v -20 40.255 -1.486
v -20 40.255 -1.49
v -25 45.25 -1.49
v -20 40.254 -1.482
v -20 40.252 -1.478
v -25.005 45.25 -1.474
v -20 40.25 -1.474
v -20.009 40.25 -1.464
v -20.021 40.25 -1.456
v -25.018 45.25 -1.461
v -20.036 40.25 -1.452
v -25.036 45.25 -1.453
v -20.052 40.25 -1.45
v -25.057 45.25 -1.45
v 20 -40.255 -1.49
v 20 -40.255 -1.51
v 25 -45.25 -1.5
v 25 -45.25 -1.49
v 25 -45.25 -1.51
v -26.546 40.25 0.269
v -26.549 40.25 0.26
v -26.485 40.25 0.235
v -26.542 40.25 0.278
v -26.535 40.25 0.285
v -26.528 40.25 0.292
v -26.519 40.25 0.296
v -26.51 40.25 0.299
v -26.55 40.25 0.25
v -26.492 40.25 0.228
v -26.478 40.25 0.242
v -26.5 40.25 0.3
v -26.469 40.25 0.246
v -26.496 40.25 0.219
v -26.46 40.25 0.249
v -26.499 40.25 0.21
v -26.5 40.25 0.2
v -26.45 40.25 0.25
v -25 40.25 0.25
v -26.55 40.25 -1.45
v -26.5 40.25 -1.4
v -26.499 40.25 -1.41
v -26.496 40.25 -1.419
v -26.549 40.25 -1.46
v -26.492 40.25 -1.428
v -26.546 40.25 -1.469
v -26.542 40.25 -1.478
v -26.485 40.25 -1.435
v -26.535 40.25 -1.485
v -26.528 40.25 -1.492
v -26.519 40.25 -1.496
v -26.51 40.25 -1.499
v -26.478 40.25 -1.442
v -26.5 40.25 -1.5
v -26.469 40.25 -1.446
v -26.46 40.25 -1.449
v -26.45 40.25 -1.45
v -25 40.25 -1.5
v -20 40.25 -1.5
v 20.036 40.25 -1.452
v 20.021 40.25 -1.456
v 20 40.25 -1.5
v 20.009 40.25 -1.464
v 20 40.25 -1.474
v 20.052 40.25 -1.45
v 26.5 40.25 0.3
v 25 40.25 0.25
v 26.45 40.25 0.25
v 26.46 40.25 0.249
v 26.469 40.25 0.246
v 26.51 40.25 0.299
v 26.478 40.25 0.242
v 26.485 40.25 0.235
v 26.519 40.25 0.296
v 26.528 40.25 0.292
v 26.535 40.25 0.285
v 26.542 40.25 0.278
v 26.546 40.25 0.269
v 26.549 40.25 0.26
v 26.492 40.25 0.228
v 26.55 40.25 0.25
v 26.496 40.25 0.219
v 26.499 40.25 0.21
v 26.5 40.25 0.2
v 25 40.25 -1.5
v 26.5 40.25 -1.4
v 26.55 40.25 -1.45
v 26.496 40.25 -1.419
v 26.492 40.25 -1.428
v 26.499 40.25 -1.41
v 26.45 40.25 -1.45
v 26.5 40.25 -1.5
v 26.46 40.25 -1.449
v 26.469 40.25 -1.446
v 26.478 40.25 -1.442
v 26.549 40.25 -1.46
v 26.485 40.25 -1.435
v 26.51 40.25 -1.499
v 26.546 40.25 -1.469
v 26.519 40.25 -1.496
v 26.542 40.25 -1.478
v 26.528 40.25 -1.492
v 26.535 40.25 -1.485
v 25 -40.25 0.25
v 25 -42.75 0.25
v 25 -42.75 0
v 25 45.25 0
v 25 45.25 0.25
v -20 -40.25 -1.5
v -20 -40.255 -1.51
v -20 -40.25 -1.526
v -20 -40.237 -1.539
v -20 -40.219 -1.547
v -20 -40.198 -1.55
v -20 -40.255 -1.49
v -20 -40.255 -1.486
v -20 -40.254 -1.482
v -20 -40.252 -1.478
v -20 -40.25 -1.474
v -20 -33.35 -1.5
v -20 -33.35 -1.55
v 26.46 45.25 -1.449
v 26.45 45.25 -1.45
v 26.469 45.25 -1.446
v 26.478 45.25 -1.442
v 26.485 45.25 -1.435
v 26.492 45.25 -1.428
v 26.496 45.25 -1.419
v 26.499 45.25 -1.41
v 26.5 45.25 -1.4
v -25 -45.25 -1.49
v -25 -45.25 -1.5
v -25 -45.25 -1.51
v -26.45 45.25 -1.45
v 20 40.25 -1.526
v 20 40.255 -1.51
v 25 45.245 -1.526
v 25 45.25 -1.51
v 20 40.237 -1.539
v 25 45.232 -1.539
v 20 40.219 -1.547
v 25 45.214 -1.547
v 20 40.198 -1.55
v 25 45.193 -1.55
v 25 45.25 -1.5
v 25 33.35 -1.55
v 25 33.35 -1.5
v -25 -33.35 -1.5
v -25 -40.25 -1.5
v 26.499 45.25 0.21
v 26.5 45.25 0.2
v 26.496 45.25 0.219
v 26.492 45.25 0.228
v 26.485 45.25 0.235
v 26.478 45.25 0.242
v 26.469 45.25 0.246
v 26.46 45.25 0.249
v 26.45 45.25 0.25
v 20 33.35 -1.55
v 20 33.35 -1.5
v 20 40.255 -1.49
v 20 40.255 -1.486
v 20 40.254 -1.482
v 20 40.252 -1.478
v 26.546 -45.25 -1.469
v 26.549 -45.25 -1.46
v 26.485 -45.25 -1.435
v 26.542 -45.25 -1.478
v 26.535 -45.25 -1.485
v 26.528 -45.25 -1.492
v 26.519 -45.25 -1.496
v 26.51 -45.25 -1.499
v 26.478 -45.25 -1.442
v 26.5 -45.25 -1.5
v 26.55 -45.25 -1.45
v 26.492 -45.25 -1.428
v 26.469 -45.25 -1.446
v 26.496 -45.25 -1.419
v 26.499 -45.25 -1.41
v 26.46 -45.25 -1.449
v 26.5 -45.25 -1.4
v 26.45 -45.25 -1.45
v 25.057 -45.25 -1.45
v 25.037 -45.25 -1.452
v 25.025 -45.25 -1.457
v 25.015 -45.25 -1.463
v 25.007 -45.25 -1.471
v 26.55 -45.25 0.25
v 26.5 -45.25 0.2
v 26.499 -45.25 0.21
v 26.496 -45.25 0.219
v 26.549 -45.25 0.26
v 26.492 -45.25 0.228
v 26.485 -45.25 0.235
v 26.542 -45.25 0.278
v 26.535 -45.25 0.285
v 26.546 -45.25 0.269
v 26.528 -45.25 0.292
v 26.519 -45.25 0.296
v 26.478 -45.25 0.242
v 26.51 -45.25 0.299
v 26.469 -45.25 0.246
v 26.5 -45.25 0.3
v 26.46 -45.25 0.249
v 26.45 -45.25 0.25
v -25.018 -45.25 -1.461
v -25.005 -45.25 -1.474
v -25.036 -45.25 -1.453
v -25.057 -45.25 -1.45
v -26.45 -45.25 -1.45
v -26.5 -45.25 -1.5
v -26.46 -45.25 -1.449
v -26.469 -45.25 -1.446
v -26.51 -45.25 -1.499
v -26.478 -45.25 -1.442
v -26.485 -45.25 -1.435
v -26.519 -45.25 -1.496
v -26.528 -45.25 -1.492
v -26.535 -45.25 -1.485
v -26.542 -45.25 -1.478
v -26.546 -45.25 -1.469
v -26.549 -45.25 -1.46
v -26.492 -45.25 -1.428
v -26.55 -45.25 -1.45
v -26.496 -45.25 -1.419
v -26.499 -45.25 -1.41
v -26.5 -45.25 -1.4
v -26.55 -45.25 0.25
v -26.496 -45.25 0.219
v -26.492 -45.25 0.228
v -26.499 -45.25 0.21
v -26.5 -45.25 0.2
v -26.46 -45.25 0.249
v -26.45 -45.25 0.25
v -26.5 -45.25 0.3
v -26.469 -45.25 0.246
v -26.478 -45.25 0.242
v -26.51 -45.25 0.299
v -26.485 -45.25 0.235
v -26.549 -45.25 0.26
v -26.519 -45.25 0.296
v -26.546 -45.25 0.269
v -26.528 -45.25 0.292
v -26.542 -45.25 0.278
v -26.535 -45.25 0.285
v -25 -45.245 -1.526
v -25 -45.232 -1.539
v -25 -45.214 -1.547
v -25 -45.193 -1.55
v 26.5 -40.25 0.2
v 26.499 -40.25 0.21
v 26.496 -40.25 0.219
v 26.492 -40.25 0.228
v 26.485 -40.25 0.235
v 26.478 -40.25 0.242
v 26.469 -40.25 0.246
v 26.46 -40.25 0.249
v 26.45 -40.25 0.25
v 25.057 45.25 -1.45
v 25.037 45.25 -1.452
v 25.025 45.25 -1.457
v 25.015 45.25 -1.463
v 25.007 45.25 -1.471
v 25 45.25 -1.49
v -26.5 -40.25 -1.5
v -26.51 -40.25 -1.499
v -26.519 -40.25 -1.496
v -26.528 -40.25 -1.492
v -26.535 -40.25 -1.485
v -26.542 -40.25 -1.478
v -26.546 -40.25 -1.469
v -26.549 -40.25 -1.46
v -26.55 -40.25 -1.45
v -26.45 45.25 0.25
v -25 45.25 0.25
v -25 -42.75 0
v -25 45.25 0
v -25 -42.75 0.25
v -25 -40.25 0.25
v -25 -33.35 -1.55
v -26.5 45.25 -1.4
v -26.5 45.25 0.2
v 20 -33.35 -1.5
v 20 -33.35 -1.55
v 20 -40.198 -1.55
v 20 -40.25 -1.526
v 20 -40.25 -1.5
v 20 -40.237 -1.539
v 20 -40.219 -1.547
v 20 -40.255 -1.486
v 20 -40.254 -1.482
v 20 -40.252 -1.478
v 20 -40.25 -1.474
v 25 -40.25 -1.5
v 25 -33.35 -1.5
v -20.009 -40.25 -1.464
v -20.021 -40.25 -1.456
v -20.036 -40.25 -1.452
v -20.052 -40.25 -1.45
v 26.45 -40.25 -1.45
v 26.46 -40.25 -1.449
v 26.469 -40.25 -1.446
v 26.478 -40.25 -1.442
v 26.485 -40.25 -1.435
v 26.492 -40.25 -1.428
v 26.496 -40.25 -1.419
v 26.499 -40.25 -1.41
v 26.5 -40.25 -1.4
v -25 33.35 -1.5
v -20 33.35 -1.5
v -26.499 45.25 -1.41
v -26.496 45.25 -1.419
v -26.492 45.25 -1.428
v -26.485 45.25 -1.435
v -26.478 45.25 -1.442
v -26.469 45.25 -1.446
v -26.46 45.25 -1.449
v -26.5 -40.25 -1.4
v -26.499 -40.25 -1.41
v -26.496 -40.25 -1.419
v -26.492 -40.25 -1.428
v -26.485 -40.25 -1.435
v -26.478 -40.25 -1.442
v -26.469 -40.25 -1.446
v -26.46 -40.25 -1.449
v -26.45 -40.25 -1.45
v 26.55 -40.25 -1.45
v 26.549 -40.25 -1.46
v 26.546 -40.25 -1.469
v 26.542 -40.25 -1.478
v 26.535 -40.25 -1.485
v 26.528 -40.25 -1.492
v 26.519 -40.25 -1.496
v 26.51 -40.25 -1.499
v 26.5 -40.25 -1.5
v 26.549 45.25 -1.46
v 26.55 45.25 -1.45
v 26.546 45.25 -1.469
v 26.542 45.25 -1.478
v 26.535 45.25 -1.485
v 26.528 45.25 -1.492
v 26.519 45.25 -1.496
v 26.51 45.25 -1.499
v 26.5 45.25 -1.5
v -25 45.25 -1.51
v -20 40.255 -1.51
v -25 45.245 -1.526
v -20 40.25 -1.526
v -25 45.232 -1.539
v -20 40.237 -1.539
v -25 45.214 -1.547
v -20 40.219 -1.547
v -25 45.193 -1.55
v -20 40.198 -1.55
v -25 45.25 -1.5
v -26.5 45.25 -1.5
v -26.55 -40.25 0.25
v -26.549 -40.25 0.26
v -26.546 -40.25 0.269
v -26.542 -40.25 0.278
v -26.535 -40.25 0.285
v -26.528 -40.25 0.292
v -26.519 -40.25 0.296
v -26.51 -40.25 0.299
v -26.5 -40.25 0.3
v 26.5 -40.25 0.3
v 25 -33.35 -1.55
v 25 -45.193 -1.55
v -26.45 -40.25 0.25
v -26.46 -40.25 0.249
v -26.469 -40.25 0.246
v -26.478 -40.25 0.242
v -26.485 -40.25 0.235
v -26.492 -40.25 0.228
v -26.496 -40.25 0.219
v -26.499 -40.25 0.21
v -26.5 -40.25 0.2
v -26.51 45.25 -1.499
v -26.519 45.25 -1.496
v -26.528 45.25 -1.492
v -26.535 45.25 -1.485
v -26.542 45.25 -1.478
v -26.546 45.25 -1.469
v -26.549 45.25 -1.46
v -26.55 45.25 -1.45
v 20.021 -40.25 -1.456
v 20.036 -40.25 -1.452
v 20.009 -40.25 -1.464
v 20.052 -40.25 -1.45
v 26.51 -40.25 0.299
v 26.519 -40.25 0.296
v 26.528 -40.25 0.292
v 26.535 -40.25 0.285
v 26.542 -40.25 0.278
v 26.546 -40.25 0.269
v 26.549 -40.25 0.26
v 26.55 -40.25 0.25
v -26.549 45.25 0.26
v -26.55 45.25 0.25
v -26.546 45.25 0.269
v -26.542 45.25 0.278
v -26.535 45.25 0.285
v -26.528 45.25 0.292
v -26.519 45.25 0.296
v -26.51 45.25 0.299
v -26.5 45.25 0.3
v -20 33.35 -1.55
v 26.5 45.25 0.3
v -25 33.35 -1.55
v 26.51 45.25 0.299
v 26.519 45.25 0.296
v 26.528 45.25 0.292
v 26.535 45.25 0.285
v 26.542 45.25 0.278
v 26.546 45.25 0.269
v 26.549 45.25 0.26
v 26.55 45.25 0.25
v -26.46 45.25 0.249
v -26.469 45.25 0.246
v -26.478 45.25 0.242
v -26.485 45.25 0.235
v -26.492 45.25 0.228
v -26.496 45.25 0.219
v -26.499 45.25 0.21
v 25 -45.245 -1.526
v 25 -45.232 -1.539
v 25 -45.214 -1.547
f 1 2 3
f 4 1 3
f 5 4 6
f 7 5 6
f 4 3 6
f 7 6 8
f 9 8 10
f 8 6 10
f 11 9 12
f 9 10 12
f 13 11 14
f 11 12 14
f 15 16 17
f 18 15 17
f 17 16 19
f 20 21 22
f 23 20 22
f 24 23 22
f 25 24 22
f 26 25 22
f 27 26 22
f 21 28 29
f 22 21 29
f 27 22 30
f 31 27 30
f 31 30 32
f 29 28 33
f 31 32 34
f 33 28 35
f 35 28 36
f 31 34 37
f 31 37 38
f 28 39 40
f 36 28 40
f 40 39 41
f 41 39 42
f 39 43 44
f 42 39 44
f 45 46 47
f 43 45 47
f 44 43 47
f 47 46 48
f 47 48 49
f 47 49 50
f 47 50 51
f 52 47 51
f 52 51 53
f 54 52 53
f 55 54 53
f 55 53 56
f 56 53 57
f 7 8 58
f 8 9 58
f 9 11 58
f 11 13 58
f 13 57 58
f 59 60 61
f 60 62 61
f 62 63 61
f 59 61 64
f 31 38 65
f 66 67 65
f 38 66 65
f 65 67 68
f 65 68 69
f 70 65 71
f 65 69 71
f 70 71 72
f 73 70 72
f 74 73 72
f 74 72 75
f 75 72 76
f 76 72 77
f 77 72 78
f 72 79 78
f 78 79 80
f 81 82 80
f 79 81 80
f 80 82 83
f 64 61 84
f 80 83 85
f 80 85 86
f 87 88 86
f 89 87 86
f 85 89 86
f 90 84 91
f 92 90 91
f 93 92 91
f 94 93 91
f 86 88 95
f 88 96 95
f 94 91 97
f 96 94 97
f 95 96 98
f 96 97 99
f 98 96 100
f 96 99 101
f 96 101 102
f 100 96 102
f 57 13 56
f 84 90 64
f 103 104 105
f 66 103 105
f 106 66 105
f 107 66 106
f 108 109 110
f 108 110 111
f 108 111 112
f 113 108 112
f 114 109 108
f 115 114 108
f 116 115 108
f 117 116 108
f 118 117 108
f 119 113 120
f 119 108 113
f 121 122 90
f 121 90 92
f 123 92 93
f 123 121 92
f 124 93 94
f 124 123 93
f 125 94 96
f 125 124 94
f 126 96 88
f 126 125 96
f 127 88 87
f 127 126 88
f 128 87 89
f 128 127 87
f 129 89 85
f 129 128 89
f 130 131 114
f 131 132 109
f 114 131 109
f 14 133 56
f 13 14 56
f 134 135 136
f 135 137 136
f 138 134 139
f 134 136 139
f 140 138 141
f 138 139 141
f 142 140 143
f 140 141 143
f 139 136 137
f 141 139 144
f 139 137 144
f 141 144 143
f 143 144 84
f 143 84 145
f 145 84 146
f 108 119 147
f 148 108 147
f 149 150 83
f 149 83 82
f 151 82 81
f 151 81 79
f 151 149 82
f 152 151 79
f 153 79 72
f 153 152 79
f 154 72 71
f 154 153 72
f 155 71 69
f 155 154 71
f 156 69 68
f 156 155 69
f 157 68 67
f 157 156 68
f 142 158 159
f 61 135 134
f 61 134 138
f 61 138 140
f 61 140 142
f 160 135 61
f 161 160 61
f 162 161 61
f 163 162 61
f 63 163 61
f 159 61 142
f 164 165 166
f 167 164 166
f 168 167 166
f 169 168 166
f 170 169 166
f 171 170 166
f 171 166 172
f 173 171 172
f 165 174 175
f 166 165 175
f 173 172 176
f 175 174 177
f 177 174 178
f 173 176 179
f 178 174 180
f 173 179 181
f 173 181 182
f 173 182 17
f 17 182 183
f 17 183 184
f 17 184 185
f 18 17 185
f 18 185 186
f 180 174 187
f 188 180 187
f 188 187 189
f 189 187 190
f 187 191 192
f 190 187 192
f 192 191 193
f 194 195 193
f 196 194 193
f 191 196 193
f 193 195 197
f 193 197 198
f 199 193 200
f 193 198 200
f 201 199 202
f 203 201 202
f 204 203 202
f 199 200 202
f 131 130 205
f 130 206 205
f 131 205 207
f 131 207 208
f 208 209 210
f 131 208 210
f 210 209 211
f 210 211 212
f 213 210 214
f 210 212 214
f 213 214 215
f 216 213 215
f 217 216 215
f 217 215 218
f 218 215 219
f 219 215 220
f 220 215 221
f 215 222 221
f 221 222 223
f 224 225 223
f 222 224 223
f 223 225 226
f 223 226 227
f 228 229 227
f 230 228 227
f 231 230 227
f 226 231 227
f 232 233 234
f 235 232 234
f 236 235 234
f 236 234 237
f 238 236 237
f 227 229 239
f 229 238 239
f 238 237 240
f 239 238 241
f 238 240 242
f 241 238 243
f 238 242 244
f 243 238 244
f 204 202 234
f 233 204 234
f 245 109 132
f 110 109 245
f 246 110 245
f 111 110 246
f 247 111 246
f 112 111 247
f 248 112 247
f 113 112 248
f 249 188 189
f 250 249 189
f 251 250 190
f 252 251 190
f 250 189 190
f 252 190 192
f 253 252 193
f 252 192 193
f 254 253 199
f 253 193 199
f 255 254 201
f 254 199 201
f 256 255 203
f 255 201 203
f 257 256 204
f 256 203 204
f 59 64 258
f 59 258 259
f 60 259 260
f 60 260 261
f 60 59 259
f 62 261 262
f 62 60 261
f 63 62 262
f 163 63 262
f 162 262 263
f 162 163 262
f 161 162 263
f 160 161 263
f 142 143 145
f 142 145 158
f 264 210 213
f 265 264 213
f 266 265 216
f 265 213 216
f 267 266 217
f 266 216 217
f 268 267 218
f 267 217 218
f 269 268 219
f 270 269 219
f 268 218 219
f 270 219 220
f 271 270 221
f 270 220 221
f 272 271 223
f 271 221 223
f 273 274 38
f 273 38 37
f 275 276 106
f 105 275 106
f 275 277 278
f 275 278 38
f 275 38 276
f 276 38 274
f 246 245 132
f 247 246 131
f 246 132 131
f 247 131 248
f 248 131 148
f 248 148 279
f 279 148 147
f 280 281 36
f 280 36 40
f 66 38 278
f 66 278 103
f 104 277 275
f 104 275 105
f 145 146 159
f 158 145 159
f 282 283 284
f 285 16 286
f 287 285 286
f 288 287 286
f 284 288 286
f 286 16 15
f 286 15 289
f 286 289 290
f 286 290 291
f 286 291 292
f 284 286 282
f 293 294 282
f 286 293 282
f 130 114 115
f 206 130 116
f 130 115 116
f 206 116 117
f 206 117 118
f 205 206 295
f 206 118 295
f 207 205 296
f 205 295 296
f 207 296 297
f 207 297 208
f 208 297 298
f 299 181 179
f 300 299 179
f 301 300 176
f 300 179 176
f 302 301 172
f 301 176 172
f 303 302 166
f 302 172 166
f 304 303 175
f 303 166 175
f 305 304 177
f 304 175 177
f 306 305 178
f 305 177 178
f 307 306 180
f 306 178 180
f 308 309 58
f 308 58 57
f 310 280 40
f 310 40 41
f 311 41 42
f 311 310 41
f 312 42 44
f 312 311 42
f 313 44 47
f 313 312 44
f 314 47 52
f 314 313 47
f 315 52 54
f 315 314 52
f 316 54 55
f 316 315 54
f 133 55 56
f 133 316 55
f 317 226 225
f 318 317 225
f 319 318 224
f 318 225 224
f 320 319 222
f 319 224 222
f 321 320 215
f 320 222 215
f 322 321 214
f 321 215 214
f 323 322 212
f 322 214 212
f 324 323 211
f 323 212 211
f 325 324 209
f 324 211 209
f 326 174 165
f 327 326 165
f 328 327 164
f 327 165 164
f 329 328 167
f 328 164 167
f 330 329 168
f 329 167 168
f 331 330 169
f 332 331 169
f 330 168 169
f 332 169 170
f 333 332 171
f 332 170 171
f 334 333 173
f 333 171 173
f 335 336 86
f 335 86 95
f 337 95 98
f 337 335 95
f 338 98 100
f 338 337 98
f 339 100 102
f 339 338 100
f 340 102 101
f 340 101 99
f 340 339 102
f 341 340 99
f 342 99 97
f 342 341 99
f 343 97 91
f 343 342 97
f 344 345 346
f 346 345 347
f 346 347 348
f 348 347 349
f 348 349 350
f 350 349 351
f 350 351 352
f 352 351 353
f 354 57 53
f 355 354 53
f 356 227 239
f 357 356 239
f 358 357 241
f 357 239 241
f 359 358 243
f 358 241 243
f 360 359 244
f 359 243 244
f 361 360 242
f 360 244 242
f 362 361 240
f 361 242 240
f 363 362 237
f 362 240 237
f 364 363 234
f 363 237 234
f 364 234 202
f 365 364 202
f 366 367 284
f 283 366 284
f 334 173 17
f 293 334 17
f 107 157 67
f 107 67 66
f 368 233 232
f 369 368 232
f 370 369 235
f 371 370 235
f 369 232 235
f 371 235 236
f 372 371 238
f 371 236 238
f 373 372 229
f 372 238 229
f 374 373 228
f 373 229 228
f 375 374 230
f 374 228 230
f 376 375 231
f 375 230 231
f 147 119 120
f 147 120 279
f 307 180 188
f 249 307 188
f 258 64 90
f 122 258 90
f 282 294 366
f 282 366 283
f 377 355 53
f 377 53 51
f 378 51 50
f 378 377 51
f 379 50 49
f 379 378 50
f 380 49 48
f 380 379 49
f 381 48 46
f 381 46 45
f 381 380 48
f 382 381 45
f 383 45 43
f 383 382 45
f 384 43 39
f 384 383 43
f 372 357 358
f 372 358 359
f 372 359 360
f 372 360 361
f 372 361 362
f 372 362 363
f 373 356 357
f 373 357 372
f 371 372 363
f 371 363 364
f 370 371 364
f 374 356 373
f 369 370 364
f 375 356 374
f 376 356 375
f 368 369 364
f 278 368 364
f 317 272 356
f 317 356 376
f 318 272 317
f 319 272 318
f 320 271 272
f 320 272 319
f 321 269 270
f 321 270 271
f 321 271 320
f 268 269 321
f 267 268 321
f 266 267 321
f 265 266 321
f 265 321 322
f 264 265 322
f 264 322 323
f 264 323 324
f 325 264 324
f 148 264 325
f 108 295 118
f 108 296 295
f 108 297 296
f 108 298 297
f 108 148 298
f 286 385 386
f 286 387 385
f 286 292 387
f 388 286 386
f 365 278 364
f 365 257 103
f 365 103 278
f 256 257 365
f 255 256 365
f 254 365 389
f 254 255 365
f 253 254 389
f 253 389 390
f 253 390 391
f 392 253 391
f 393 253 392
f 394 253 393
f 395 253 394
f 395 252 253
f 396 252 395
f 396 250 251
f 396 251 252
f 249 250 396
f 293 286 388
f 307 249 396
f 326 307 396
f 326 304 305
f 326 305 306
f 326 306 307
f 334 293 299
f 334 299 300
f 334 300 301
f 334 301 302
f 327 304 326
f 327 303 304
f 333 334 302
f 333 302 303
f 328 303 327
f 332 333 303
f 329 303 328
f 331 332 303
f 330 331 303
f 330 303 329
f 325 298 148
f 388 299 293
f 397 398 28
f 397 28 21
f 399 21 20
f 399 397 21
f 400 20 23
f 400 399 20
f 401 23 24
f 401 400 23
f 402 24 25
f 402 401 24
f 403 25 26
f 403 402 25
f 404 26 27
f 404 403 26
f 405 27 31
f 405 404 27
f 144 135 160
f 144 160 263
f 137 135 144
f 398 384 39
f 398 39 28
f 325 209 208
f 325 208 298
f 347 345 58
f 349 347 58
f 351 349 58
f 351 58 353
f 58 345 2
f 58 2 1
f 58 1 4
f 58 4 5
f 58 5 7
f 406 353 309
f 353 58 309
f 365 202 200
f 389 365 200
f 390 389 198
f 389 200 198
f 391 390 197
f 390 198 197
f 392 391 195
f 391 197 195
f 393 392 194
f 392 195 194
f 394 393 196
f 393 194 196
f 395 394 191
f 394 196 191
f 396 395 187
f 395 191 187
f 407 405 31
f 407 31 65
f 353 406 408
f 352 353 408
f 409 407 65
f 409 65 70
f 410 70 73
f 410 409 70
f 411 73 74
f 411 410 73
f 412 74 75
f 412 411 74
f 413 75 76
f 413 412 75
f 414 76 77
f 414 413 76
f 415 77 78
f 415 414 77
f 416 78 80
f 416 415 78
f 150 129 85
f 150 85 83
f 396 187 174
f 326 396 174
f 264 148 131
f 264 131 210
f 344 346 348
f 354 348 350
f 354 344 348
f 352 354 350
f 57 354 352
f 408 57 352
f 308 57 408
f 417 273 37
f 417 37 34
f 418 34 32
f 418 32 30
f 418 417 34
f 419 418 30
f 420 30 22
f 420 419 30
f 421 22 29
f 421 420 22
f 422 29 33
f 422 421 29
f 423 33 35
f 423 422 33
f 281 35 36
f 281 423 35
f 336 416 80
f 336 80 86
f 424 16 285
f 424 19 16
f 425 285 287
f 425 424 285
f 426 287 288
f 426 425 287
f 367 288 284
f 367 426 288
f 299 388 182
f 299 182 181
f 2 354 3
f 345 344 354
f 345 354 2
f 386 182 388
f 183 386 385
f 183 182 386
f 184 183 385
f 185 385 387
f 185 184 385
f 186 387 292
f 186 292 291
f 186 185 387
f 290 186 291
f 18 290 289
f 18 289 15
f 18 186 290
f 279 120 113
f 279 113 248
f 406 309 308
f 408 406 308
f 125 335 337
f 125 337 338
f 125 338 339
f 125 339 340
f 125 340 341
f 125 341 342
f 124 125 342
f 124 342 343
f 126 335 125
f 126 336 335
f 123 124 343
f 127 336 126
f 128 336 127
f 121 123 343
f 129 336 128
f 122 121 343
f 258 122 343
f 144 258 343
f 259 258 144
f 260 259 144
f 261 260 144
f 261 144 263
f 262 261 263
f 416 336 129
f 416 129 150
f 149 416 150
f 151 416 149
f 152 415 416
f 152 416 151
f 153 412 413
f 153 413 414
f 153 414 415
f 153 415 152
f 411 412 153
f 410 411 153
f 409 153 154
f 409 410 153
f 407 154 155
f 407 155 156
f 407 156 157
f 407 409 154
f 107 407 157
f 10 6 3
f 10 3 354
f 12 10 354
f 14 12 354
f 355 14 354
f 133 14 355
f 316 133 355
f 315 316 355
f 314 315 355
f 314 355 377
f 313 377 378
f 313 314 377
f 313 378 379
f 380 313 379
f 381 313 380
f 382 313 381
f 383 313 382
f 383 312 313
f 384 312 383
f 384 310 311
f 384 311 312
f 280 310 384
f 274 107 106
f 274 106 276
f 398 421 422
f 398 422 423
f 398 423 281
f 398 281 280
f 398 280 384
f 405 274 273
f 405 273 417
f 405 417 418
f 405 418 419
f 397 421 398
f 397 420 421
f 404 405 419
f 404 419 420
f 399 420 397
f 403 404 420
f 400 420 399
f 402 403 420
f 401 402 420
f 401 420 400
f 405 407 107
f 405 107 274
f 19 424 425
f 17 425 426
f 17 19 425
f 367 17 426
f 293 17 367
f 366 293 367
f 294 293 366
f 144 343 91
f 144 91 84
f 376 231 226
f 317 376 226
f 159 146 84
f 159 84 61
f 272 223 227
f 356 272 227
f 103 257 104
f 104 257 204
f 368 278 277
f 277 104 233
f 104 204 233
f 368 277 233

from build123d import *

# Parameters (mm, degrees)
SKETCH1_W            = 50
SKETCH1_H            = 88
BOSS_EXTRUDE1_DEPTH  = 0.25
BOSS_EXTRUDE2_DEPTH  = 5
SKETCH5_W            = 5
SKETCH5_H            = 11.9
BOSS_EXTRUDE3_DEPTH  = 0.05
CUT_EXTRUDE1_DEPTH   = 0.2
FILLET1_R            = 0.04
FILLET1_OF_MIRROR1_R = 0.04


with BuildPart() as part:
    # Sketch1 → Boss-Extrude1 (new body)
    with BuildSketch(Plane.XY.offset(0.25)):
        with Locations((0, 1.25)):
            Rectangle(SKETCH1_W, SKETCH1_H)
    extrude(amount=-BOSS_EXTRUDE1_DEPTH)

    # Sketch4 → Boss-Extrude2 (add)
    with BuildSketch(Plane(origin=(0, -45.25, 0), x_dir=(-1, 0, 0), z_dir=(0, -1, 0))):
        with BuildLine():
            Line((-26.45, -0.25), (26.45, -0.25))
            ThreePointArc((26.45, -0.25), (26.485355339, -0.235355339), (26.5, -0.2))
            Line((26.5, -0.2), (26.5, 1.4))
            ThreePointArc((26.5, 1.4), (26.485355339, 1.435355339), (26.45, 1.45))
            Line((26.45, 1.45), (20, 1.45))
            Line((20, 1.45), (20, 1.5))
            Line((20, 1.5), (26.5, 1.5))
            ThreePointArc((26.5, 1.5), (26.535355339, 1.485355339), (26.55, 1.45))
            Line((26.55, 1.45), (26.55, -0.25))
            ThreePointArc((26.55, -0.25), (26.535355339, -0.285355339), (26.5, -0.3))
            Line((26.5, -0.3), (-26.5, -0.3))
            ThreePointArc((-26.5, -0.3), (-26.535355339, -0.285355339), (-26.55, -0.25))
            Line((-26.55, -0.25), (-26.55, 1.45))
            ThreePointArc((-26.55, 1.45), (-26.535355339, 1.485355339), (-26.5, 1.5))
            Line((-26.5, 1.5), (-20, 1.5))
            Line((-20, 1.5), (-20, 1.45))
            Line((-20, 1.45), (-26.45, 1.45))
            ThreePointArc((-26.45, 1.45), (-26.485355339, 1.435355339), (-26.5, 1.4))
            Line((-26.5, 1.4), (-26.5, -0.2))
            ThreePointArc((-26.5, -0.2), (-26.485355339, -0.235355339), (-26.45, -0.25))
        make_face()
    boss_extrude2 = extrude(amount=-BOSS_EXTRUDE2_DEPTH)

    # Sketch5 → Boss-Extrude3 (add)
    with BuildSketch(Plane(origin=(0, 0, -1.5), x_dir=(-1, 0, 0), z_dir=(0, 0, -1))):
        with Locations((22.5, -39.3)):
            Rectangle(SKETCH5_W, SKETCH5_H)
        with Locations((-22.5, -39.3)):
            Rectangle(SKETCH5_W, SKETCH5_H)
    boss_extrude3 = extrude(amount=BOSS_EXTRUDE3_DEPTH)

    # Sketch6 → Cut-Extrude1 (cut)
    with BuildSketch(Plane(origin=(0, 0, -1.55), x_dir=(-1, 0, 0), z_dir=(0, 0, -1))):
        Polygon((20, -45.25), (25, -45.25), (20, -40.254912883), align=None)
        Polygon((-20, -40.254912883), (-25, -45.25), (-20, -45.25), align=None)
    cut_extrude1 = extrude(amount=-CUT_EXTRUDE1_DEPTH, mode=Mode.SUBTRACT)

    # Fillet1
    fillet1_edges = [part.edges().sort_by_distance(p)[0] for p in [
        (-22.5, -42.752456442, -1.45),
        (-22.5, -42.752456442, -1.55),
        (22.5, -42.752456442, -1.55),
        (22.5, -42.752456442, -1.45),
    ]]
    fillet(fillet1_edges, radius=FILLET1_R)

    # Mirror1: Boss-Extrude2, Boss-Extrude3, Cut-Extrude1 across plane
    add(boss_extrude2.mirror(Plane(origin=(0, 0, 0), x_dir=(0, 0, 1), z_dir=(0, -1, 0))))
    add(boss_extrude3.mirror(Plane(origin=(0, 0, 0), x_dir=(0, 0, 1), z_dir=(0, -1, 0))))
    add(cut_extrude1.mirror(Plane(origin=(0, 0, 0), x_dir=(0, 0, 1), z_dir=(0, -1, 0))), mode=Mode.SUBTRACT)

    # Fillet1 of Mirror1
    fillet1_of_mirror1_edges = [part.edges().sort_by_distance(p)[0] for p in [
        (-22.5, 42.752456442, -1.45),
        (-22.5, 42.752456442, -1.55),
        (22.5, 42.752456442, -1.55),
        (22.5, 42.752456442, -1.45),
    ]]
    fillet(fillet1_of_mirror1_edges, radius=FILLET1_OF_MIRROR1_R)


solid = part.part
